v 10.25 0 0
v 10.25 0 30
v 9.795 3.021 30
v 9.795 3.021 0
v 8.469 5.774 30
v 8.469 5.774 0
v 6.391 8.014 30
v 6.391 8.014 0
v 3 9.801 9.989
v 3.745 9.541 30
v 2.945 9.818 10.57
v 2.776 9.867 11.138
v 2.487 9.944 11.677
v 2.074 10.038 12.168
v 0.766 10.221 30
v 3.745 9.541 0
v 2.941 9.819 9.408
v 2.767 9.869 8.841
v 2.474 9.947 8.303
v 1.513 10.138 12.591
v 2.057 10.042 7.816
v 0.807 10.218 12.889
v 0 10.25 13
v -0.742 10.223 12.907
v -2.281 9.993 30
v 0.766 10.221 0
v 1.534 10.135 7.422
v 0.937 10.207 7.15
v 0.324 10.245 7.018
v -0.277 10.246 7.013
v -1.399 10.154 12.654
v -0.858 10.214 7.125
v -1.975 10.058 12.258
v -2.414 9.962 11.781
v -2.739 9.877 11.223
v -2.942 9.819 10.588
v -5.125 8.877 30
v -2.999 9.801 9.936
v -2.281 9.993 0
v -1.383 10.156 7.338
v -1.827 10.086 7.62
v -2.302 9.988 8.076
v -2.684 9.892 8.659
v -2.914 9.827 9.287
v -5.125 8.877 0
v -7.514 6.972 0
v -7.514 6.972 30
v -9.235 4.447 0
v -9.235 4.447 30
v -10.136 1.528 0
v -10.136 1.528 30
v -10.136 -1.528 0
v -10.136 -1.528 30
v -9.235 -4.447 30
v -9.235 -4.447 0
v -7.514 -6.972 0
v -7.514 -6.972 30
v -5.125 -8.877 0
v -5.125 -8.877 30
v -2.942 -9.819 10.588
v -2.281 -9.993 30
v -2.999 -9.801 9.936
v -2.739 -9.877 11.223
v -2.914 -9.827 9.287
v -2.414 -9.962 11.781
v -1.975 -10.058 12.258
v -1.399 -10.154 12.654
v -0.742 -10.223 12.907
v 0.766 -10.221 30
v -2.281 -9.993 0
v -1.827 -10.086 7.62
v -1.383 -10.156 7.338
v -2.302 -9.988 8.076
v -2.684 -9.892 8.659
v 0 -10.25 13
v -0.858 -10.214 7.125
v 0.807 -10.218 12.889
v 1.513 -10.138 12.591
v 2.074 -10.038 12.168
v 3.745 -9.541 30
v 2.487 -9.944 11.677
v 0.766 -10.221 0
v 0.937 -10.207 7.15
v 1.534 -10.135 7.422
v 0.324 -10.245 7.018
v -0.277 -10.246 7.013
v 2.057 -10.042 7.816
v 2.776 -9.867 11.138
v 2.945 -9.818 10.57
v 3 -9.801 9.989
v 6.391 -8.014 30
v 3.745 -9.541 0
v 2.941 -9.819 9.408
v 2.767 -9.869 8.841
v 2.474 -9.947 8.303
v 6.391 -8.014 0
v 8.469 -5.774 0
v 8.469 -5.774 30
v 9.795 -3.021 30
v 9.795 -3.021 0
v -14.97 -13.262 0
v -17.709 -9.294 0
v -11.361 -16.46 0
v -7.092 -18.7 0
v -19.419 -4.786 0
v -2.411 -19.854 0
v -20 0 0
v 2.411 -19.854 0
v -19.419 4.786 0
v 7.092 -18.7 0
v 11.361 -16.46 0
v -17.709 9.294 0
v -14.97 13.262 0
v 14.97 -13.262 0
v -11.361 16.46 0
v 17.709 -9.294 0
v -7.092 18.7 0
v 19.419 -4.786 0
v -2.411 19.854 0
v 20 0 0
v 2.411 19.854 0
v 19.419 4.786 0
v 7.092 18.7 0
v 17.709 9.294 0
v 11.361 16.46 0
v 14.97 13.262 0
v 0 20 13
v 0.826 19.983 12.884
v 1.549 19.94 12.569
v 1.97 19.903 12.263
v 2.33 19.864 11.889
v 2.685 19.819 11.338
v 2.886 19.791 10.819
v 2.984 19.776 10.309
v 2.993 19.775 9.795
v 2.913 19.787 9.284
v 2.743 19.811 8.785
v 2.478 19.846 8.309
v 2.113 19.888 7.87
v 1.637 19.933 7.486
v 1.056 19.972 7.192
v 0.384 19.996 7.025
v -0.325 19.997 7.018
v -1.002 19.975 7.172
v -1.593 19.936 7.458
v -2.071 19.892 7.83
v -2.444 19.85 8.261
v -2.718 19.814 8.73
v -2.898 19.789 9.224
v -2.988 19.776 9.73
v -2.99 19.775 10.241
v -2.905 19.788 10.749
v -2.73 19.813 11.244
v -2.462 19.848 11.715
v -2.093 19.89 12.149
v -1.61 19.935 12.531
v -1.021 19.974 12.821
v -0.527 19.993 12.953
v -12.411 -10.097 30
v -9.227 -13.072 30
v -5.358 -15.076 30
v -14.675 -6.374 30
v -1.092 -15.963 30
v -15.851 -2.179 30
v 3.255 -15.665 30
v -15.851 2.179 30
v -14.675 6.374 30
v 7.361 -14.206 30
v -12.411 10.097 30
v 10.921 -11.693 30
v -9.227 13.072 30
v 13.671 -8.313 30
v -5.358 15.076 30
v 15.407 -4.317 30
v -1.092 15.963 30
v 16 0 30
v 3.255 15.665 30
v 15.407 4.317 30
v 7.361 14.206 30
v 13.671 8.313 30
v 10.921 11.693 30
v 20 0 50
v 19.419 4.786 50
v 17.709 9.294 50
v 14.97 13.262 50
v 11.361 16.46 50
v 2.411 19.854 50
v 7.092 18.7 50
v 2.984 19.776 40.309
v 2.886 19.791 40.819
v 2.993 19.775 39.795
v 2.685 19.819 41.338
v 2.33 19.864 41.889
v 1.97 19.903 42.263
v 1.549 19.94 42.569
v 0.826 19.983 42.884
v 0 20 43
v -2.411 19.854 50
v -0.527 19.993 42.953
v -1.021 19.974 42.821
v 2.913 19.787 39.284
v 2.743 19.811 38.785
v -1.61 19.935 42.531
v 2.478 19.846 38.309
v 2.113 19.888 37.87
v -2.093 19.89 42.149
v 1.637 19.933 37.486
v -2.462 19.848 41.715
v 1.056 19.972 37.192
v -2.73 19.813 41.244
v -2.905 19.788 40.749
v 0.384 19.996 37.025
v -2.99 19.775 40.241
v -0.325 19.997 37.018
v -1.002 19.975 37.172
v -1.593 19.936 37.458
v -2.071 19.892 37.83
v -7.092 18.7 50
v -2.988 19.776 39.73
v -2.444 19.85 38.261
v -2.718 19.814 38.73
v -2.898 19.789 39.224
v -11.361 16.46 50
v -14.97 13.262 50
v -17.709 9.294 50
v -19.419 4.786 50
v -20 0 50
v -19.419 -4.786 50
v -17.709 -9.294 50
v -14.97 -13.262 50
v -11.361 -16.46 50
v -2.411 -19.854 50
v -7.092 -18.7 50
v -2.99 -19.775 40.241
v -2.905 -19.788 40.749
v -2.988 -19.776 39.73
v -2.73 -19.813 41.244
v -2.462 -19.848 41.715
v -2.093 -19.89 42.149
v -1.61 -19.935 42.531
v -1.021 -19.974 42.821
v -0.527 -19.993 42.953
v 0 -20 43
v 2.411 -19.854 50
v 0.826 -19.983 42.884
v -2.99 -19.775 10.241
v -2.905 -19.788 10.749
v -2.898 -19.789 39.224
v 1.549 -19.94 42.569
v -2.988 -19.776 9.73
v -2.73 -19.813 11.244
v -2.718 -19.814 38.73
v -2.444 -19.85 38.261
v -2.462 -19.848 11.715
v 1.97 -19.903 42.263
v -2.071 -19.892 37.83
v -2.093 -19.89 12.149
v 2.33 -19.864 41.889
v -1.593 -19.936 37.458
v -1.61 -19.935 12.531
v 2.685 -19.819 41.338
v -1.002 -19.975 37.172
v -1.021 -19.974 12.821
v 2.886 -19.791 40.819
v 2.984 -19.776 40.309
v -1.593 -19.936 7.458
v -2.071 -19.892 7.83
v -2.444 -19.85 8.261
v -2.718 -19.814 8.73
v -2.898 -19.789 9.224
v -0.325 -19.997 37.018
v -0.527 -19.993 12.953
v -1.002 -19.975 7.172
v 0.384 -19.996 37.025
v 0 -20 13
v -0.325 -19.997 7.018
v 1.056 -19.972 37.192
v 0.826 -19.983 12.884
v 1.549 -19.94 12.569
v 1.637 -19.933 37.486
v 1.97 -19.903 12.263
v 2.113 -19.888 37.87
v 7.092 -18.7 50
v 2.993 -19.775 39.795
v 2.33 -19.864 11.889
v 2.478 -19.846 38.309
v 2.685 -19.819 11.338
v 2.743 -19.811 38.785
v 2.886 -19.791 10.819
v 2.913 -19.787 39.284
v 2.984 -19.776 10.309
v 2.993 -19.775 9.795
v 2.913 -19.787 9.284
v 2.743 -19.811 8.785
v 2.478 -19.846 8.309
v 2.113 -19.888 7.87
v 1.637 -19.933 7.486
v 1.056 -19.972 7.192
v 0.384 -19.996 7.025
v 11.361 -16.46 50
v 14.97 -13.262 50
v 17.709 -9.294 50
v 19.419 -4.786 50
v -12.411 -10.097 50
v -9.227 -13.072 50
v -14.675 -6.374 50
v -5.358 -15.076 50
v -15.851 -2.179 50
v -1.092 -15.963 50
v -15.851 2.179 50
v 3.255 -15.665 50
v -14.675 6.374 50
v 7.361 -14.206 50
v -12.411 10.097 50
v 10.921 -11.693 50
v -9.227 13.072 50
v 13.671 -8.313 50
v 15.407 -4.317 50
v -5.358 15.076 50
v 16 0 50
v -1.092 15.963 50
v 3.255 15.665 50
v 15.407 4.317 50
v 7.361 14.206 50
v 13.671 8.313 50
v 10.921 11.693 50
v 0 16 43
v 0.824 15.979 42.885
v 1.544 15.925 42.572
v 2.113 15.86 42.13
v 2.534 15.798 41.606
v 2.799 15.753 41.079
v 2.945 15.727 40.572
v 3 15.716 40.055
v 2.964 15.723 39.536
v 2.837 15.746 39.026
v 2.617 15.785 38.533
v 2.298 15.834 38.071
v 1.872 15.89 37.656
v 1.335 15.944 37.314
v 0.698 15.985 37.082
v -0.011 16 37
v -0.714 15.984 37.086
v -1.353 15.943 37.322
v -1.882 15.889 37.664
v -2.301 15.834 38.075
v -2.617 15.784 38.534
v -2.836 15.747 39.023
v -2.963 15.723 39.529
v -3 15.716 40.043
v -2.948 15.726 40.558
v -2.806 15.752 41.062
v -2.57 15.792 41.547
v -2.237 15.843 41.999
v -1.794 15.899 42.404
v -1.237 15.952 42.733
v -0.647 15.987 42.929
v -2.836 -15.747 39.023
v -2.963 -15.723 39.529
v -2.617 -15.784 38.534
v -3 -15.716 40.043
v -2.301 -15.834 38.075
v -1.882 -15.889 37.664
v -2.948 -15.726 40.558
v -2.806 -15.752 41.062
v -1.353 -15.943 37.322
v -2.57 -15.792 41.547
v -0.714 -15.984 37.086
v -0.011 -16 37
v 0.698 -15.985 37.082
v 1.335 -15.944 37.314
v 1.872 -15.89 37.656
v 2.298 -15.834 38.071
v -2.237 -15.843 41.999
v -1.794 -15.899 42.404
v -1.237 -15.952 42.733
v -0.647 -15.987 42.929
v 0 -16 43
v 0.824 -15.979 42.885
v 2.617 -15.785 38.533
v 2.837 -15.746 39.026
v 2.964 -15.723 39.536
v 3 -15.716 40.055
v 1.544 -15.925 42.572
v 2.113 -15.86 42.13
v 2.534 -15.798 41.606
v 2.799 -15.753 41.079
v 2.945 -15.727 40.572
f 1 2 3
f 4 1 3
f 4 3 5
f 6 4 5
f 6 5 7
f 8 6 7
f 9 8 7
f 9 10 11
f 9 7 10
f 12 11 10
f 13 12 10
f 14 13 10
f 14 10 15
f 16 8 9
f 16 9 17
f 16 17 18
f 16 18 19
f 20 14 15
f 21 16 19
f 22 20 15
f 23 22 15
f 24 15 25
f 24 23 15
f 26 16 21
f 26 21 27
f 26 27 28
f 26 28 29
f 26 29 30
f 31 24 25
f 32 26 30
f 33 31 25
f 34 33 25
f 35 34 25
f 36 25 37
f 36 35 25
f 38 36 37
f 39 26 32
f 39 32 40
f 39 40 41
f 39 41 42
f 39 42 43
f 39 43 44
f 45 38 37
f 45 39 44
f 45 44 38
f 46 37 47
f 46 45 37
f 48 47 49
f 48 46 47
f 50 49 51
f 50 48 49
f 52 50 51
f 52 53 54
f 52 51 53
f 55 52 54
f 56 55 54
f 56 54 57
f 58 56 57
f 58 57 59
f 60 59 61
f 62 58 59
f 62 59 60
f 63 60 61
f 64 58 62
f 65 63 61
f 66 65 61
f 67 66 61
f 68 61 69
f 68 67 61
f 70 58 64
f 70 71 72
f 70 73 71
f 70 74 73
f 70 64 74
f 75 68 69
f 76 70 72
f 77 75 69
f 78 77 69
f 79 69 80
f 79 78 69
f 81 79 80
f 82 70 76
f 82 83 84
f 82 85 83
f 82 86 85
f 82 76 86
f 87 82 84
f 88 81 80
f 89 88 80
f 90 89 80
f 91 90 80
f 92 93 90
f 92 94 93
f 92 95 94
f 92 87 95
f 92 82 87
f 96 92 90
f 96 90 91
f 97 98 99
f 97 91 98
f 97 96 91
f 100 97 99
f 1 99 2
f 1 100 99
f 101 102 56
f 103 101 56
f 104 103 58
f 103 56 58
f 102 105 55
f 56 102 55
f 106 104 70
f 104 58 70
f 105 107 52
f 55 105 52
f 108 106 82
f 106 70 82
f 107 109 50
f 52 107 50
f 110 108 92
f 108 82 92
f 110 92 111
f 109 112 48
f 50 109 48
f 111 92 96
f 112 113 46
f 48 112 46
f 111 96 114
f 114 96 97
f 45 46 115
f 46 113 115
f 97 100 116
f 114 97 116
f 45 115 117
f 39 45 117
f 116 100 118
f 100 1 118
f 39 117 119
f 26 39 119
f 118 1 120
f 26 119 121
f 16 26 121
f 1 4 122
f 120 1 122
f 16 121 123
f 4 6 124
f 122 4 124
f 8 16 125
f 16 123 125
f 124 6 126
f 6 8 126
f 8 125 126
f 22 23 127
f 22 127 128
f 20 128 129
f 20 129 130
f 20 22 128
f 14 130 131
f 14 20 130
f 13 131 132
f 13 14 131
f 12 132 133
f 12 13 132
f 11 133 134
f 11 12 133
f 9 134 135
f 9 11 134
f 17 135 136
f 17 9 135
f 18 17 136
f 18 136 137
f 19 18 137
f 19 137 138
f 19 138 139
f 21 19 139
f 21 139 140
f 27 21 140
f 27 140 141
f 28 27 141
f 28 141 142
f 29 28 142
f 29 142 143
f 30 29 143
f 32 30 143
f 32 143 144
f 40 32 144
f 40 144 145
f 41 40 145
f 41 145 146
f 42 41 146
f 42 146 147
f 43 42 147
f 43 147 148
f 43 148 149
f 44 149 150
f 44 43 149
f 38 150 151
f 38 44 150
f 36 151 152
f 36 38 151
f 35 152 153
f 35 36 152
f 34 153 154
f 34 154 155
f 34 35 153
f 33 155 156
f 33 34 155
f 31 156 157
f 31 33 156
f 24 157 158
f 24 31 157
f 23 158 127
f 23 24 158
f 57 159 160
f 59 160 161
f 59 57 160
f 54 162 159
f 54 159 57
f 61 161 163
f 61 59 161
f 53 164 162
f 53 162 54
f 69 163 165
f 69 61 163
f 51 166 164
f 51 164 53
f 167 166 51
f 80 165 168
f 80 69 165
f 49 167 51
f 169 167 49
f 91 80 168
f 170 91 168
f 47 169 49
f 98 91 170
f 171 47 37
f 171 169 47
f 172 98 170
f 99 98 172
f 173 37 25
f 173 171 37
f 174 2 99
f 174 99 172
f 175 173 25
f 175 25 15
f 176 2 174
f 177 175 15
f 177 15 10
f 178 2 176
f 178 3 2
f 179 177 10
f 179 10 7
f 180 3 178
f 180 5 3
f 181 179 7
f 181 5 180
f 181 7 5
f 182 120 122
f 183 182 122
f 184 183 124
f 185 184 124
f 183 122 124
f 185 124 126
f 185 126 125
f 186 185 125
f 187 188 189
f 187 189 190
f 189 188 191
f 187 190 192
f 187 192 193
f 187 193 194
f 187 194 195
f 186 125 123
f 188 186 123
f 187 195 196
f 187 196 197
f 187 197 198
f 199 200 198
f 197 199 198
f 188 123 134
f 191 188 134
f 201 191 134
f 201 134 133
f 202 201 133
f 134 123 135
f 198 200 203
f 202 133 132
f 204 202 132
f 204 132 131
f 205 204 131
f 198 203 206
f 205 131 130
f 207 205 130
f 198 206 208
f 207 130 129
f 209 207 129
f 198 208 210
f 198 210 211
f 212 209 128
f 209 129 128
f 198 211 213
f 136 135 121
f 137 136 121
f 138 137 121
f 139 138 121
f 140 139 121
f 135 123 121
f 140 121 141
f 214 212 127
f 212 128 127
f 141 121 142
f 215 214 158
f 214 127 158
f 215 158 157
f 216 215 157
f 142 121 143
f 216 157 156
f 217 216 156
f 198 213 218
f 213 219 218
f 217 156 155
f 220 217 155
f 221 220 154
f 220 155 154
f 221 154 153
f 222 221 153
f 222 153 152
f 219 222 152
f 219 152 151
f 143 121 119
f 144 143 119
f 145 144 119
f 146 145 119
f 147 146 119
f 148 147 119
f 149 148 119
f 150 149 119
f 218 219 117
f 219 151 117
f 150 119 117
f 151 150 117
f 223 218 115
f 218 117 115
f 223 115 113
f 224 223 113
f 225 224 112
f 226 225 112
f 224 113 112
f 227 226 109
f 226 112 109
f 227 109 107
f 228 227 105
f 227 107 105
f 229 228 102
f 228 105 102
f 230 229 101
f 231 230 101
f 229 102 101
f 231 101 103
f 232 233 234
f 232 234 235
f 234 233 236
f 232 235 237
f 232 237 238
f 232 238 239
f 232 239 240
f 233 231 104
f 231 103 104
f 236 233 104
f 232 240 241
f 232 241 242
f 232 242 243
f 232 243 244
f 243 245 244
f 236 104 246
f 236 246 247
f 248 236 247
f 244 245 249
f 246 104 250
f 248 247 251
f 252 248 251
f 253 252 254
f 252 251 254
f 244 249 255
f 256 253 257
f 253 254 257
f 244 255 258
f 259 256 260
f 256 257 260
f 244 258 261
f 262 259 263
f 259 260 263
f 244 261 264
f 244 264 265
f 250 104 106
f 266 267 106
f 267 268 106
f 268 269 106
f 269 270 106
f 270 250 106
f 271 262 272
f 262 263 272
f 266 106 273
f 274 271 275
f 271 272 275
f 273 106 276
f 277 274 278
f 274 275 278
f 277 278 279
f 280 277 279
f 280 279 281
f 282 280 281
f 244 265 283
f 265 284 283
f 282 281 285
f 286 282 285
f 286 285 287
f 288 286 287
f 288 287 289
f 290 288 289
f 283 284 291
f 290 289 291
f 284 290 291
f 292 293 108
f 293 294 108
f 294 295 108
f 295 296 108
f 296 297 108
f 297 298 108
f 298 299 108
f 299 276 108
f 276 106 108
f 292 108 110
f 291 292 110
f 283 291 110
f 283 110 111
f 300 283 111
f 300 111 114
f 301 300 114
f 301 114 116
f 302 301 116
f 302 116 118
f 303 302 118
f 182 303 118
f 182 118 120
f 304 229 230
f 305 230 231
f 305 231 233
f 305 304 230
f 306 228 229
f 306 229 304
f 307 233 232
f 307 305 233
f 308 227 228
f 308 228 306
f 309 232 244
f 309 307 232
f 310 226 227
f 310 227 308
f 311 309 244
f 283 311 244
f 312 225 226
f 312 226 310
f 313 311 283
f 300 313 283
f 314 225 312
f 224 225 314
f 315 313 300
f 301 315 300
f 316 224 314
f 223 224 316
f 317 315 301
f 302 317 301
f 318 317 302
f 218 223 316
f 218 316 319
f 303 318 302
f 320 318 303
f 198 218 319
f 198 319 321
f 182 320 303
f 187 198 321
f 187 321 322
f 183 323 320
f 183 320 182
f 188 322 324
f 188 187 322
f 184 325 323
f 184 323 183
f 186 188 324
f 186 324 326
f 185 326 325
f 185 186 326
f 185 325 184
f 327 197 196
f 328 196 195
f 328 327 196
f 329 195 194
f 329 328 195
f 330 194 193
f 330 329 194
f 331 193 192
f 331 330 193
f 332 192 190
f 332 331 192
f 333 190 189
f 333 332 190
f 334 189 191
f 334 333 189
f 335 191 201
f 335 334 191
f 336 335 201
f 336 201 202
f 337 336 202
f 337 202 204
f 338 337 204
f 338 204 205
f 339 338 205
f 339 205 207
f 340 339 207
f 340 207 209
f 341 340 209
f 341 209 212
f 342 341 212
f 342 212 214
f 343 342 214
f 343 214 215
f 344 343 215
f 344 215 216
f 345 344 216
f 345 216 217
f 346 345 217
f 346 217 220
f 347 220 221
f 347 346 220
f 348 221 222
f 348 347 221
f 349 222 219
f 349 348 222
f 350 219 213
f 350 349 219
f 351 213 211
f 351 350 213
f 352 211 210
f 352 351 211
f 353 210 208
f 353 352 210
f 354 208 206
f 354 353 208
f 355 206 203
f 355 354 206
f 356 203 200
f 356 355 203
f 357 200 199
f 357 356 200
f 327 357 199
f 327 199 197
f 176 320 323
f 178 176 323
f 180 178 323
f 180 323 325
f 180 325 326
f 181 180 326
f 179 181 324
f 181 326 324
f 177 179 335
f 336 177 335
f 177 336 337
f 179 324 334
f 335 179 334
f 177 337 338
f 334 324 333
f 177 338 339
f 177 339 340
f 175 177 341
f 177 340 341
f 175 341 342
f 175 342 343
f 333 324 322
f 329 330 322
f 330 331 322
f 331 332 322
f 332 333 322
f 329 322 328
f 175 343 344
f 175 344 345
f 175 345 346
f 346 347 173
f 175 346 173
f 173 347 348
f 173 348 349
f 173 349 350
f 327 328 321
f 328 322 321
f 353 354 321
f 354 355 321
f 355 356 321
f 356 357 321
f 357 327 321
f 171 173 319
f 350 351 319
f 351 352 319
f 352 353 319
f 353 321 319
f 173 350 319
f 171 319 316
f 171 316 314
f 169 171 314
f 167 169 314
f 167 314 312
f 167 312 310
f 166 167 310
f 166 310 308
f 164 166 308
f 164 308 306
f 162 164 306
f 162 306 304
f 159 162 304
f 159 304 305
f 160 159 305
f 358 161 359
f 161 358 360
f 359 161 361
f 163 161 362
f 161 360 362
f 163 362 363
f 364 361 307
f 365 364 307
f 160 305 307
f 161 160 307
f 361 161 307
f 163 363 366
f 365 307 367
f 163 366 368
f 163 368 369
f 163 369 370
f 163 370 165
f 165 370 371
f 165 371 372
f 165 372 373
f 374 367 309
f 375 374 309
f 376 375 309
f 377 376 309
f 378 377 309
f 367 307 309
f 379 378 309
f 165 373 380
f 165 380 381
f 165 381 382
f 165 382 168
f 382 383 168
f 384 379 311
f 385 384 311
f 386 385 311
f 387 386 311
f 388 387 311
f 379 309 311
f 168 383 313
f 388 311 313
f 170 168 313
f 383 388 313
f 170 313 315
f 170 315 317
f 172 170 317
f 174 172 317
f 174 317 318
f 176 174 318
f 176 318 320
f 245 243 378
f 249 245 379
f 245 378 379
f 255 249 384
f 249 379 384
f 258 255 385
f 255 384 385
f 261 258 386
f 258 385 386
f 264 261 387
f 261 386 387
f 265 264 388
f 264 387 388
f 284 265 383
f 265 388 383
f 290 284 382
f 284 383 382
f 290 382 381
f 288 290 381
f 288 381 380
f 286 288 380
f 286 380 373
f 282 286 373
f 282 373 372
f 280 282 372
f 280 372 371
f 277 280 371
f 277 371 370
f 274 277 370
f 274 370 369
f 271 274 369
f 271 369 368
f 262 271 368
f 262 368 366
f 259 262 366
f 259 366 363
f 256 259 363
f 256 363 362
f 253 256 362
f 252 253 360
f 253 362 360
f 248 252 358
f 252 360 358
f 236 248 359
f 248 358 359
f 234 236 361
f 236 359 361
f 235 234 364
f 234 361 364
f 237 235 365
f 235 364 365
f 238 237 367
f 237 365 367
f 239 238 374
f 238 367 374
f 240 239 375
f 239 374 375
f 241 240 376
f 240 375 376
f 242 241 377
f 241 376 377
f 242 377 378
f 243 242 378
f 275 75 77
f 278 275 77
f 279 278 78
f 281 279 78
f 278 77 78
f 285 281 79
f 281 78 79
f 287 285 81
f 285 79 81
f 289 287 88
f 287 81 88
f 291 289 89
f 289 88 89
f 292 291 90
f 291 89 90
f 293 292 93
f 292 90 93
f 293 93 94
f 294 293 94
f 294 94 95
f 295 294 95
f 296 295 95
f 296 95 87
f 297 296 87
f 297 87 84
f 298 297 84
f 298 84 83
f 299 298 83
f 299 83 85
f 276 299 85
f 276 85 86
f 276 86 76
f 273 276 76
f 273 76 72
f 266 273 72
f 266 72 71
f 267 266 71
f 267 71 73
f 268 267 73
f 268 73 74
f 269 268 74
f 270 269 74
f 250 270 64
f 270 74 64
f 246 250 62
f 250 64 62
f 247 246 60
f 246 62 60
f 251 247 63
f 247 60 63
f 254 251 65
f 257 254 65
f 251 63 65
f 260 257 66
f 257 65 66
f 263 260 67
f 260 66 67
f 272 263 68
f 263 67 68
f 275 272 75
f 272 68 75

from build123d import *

# Parameters (mm, degrees)
ESQUISSE1_R                  = 20
ESQUISSE1_R_2                = 10.25
BOSS_EXTRU_1_DEPTH           = 50
ESQUISSE2_R                  = 16
ENL_V_MAT_EXTRU_1_DEPTH      = 20
ESQUISSE3_R                  = 3
ENL_V_MAT_EXTRU_2_DEPTH      = 21
ENL_V_MAT_EXTRU_2_DEPTH_BACK = 21


with BuildPart() as part:
    # Esquisse1 → Boss.-Extru.1 (new body)
    with BuildSketch(Plane.XY):
        Circle(ESQUISSE1_R)
        Circle(ESQUISSE1_R_2, mode=Mode.SUBTRACT)
    extrude(amount=BOSS_EXTRU_1_DEPTH)

    # Esquisse2 → Enlèv. mat.-Extru.1 (cut)
    with BuildSketch(Plane.XY.offset(50)):
        Circle(ESQUISSE2_R)
    extrude(amount=-ENL_V_MAT_EXTRU_1_DEPTH, mode=Mode.SUBTRACT)

    # Esquisse3 → Enlèv. mat.-Extru.2 (cut, two sides)
    with BuildSketch(Plane(origin=(0, 0, 0), x_dir=(1, 0, 0), z_dir=(0, 1, 0))) as enl_v_mat_extru_2_sk:
        with Locations(Location((0, -10, 0), (0, 0, 270))):  # turned: the seam where the file's is
            Circle(ESQUISSE3_R)
        with Locations(Location((0, -40, 0), (0, 0, 270))):  # turned: the seam where the file's is
            Circle(ESQUISSE3_R)
    extrude(amount=ENL_V_MAT_EXTRU_2_DEPTH, mode=Mode.SUBTRACT)
    extrude(enl_v_mat_extru_2_sk.sketch, amount=-ENL_V_MAT_EXTRU_2_DEPTH_BACK, mode=Mode.SUBTRACT)


solid = part.part
